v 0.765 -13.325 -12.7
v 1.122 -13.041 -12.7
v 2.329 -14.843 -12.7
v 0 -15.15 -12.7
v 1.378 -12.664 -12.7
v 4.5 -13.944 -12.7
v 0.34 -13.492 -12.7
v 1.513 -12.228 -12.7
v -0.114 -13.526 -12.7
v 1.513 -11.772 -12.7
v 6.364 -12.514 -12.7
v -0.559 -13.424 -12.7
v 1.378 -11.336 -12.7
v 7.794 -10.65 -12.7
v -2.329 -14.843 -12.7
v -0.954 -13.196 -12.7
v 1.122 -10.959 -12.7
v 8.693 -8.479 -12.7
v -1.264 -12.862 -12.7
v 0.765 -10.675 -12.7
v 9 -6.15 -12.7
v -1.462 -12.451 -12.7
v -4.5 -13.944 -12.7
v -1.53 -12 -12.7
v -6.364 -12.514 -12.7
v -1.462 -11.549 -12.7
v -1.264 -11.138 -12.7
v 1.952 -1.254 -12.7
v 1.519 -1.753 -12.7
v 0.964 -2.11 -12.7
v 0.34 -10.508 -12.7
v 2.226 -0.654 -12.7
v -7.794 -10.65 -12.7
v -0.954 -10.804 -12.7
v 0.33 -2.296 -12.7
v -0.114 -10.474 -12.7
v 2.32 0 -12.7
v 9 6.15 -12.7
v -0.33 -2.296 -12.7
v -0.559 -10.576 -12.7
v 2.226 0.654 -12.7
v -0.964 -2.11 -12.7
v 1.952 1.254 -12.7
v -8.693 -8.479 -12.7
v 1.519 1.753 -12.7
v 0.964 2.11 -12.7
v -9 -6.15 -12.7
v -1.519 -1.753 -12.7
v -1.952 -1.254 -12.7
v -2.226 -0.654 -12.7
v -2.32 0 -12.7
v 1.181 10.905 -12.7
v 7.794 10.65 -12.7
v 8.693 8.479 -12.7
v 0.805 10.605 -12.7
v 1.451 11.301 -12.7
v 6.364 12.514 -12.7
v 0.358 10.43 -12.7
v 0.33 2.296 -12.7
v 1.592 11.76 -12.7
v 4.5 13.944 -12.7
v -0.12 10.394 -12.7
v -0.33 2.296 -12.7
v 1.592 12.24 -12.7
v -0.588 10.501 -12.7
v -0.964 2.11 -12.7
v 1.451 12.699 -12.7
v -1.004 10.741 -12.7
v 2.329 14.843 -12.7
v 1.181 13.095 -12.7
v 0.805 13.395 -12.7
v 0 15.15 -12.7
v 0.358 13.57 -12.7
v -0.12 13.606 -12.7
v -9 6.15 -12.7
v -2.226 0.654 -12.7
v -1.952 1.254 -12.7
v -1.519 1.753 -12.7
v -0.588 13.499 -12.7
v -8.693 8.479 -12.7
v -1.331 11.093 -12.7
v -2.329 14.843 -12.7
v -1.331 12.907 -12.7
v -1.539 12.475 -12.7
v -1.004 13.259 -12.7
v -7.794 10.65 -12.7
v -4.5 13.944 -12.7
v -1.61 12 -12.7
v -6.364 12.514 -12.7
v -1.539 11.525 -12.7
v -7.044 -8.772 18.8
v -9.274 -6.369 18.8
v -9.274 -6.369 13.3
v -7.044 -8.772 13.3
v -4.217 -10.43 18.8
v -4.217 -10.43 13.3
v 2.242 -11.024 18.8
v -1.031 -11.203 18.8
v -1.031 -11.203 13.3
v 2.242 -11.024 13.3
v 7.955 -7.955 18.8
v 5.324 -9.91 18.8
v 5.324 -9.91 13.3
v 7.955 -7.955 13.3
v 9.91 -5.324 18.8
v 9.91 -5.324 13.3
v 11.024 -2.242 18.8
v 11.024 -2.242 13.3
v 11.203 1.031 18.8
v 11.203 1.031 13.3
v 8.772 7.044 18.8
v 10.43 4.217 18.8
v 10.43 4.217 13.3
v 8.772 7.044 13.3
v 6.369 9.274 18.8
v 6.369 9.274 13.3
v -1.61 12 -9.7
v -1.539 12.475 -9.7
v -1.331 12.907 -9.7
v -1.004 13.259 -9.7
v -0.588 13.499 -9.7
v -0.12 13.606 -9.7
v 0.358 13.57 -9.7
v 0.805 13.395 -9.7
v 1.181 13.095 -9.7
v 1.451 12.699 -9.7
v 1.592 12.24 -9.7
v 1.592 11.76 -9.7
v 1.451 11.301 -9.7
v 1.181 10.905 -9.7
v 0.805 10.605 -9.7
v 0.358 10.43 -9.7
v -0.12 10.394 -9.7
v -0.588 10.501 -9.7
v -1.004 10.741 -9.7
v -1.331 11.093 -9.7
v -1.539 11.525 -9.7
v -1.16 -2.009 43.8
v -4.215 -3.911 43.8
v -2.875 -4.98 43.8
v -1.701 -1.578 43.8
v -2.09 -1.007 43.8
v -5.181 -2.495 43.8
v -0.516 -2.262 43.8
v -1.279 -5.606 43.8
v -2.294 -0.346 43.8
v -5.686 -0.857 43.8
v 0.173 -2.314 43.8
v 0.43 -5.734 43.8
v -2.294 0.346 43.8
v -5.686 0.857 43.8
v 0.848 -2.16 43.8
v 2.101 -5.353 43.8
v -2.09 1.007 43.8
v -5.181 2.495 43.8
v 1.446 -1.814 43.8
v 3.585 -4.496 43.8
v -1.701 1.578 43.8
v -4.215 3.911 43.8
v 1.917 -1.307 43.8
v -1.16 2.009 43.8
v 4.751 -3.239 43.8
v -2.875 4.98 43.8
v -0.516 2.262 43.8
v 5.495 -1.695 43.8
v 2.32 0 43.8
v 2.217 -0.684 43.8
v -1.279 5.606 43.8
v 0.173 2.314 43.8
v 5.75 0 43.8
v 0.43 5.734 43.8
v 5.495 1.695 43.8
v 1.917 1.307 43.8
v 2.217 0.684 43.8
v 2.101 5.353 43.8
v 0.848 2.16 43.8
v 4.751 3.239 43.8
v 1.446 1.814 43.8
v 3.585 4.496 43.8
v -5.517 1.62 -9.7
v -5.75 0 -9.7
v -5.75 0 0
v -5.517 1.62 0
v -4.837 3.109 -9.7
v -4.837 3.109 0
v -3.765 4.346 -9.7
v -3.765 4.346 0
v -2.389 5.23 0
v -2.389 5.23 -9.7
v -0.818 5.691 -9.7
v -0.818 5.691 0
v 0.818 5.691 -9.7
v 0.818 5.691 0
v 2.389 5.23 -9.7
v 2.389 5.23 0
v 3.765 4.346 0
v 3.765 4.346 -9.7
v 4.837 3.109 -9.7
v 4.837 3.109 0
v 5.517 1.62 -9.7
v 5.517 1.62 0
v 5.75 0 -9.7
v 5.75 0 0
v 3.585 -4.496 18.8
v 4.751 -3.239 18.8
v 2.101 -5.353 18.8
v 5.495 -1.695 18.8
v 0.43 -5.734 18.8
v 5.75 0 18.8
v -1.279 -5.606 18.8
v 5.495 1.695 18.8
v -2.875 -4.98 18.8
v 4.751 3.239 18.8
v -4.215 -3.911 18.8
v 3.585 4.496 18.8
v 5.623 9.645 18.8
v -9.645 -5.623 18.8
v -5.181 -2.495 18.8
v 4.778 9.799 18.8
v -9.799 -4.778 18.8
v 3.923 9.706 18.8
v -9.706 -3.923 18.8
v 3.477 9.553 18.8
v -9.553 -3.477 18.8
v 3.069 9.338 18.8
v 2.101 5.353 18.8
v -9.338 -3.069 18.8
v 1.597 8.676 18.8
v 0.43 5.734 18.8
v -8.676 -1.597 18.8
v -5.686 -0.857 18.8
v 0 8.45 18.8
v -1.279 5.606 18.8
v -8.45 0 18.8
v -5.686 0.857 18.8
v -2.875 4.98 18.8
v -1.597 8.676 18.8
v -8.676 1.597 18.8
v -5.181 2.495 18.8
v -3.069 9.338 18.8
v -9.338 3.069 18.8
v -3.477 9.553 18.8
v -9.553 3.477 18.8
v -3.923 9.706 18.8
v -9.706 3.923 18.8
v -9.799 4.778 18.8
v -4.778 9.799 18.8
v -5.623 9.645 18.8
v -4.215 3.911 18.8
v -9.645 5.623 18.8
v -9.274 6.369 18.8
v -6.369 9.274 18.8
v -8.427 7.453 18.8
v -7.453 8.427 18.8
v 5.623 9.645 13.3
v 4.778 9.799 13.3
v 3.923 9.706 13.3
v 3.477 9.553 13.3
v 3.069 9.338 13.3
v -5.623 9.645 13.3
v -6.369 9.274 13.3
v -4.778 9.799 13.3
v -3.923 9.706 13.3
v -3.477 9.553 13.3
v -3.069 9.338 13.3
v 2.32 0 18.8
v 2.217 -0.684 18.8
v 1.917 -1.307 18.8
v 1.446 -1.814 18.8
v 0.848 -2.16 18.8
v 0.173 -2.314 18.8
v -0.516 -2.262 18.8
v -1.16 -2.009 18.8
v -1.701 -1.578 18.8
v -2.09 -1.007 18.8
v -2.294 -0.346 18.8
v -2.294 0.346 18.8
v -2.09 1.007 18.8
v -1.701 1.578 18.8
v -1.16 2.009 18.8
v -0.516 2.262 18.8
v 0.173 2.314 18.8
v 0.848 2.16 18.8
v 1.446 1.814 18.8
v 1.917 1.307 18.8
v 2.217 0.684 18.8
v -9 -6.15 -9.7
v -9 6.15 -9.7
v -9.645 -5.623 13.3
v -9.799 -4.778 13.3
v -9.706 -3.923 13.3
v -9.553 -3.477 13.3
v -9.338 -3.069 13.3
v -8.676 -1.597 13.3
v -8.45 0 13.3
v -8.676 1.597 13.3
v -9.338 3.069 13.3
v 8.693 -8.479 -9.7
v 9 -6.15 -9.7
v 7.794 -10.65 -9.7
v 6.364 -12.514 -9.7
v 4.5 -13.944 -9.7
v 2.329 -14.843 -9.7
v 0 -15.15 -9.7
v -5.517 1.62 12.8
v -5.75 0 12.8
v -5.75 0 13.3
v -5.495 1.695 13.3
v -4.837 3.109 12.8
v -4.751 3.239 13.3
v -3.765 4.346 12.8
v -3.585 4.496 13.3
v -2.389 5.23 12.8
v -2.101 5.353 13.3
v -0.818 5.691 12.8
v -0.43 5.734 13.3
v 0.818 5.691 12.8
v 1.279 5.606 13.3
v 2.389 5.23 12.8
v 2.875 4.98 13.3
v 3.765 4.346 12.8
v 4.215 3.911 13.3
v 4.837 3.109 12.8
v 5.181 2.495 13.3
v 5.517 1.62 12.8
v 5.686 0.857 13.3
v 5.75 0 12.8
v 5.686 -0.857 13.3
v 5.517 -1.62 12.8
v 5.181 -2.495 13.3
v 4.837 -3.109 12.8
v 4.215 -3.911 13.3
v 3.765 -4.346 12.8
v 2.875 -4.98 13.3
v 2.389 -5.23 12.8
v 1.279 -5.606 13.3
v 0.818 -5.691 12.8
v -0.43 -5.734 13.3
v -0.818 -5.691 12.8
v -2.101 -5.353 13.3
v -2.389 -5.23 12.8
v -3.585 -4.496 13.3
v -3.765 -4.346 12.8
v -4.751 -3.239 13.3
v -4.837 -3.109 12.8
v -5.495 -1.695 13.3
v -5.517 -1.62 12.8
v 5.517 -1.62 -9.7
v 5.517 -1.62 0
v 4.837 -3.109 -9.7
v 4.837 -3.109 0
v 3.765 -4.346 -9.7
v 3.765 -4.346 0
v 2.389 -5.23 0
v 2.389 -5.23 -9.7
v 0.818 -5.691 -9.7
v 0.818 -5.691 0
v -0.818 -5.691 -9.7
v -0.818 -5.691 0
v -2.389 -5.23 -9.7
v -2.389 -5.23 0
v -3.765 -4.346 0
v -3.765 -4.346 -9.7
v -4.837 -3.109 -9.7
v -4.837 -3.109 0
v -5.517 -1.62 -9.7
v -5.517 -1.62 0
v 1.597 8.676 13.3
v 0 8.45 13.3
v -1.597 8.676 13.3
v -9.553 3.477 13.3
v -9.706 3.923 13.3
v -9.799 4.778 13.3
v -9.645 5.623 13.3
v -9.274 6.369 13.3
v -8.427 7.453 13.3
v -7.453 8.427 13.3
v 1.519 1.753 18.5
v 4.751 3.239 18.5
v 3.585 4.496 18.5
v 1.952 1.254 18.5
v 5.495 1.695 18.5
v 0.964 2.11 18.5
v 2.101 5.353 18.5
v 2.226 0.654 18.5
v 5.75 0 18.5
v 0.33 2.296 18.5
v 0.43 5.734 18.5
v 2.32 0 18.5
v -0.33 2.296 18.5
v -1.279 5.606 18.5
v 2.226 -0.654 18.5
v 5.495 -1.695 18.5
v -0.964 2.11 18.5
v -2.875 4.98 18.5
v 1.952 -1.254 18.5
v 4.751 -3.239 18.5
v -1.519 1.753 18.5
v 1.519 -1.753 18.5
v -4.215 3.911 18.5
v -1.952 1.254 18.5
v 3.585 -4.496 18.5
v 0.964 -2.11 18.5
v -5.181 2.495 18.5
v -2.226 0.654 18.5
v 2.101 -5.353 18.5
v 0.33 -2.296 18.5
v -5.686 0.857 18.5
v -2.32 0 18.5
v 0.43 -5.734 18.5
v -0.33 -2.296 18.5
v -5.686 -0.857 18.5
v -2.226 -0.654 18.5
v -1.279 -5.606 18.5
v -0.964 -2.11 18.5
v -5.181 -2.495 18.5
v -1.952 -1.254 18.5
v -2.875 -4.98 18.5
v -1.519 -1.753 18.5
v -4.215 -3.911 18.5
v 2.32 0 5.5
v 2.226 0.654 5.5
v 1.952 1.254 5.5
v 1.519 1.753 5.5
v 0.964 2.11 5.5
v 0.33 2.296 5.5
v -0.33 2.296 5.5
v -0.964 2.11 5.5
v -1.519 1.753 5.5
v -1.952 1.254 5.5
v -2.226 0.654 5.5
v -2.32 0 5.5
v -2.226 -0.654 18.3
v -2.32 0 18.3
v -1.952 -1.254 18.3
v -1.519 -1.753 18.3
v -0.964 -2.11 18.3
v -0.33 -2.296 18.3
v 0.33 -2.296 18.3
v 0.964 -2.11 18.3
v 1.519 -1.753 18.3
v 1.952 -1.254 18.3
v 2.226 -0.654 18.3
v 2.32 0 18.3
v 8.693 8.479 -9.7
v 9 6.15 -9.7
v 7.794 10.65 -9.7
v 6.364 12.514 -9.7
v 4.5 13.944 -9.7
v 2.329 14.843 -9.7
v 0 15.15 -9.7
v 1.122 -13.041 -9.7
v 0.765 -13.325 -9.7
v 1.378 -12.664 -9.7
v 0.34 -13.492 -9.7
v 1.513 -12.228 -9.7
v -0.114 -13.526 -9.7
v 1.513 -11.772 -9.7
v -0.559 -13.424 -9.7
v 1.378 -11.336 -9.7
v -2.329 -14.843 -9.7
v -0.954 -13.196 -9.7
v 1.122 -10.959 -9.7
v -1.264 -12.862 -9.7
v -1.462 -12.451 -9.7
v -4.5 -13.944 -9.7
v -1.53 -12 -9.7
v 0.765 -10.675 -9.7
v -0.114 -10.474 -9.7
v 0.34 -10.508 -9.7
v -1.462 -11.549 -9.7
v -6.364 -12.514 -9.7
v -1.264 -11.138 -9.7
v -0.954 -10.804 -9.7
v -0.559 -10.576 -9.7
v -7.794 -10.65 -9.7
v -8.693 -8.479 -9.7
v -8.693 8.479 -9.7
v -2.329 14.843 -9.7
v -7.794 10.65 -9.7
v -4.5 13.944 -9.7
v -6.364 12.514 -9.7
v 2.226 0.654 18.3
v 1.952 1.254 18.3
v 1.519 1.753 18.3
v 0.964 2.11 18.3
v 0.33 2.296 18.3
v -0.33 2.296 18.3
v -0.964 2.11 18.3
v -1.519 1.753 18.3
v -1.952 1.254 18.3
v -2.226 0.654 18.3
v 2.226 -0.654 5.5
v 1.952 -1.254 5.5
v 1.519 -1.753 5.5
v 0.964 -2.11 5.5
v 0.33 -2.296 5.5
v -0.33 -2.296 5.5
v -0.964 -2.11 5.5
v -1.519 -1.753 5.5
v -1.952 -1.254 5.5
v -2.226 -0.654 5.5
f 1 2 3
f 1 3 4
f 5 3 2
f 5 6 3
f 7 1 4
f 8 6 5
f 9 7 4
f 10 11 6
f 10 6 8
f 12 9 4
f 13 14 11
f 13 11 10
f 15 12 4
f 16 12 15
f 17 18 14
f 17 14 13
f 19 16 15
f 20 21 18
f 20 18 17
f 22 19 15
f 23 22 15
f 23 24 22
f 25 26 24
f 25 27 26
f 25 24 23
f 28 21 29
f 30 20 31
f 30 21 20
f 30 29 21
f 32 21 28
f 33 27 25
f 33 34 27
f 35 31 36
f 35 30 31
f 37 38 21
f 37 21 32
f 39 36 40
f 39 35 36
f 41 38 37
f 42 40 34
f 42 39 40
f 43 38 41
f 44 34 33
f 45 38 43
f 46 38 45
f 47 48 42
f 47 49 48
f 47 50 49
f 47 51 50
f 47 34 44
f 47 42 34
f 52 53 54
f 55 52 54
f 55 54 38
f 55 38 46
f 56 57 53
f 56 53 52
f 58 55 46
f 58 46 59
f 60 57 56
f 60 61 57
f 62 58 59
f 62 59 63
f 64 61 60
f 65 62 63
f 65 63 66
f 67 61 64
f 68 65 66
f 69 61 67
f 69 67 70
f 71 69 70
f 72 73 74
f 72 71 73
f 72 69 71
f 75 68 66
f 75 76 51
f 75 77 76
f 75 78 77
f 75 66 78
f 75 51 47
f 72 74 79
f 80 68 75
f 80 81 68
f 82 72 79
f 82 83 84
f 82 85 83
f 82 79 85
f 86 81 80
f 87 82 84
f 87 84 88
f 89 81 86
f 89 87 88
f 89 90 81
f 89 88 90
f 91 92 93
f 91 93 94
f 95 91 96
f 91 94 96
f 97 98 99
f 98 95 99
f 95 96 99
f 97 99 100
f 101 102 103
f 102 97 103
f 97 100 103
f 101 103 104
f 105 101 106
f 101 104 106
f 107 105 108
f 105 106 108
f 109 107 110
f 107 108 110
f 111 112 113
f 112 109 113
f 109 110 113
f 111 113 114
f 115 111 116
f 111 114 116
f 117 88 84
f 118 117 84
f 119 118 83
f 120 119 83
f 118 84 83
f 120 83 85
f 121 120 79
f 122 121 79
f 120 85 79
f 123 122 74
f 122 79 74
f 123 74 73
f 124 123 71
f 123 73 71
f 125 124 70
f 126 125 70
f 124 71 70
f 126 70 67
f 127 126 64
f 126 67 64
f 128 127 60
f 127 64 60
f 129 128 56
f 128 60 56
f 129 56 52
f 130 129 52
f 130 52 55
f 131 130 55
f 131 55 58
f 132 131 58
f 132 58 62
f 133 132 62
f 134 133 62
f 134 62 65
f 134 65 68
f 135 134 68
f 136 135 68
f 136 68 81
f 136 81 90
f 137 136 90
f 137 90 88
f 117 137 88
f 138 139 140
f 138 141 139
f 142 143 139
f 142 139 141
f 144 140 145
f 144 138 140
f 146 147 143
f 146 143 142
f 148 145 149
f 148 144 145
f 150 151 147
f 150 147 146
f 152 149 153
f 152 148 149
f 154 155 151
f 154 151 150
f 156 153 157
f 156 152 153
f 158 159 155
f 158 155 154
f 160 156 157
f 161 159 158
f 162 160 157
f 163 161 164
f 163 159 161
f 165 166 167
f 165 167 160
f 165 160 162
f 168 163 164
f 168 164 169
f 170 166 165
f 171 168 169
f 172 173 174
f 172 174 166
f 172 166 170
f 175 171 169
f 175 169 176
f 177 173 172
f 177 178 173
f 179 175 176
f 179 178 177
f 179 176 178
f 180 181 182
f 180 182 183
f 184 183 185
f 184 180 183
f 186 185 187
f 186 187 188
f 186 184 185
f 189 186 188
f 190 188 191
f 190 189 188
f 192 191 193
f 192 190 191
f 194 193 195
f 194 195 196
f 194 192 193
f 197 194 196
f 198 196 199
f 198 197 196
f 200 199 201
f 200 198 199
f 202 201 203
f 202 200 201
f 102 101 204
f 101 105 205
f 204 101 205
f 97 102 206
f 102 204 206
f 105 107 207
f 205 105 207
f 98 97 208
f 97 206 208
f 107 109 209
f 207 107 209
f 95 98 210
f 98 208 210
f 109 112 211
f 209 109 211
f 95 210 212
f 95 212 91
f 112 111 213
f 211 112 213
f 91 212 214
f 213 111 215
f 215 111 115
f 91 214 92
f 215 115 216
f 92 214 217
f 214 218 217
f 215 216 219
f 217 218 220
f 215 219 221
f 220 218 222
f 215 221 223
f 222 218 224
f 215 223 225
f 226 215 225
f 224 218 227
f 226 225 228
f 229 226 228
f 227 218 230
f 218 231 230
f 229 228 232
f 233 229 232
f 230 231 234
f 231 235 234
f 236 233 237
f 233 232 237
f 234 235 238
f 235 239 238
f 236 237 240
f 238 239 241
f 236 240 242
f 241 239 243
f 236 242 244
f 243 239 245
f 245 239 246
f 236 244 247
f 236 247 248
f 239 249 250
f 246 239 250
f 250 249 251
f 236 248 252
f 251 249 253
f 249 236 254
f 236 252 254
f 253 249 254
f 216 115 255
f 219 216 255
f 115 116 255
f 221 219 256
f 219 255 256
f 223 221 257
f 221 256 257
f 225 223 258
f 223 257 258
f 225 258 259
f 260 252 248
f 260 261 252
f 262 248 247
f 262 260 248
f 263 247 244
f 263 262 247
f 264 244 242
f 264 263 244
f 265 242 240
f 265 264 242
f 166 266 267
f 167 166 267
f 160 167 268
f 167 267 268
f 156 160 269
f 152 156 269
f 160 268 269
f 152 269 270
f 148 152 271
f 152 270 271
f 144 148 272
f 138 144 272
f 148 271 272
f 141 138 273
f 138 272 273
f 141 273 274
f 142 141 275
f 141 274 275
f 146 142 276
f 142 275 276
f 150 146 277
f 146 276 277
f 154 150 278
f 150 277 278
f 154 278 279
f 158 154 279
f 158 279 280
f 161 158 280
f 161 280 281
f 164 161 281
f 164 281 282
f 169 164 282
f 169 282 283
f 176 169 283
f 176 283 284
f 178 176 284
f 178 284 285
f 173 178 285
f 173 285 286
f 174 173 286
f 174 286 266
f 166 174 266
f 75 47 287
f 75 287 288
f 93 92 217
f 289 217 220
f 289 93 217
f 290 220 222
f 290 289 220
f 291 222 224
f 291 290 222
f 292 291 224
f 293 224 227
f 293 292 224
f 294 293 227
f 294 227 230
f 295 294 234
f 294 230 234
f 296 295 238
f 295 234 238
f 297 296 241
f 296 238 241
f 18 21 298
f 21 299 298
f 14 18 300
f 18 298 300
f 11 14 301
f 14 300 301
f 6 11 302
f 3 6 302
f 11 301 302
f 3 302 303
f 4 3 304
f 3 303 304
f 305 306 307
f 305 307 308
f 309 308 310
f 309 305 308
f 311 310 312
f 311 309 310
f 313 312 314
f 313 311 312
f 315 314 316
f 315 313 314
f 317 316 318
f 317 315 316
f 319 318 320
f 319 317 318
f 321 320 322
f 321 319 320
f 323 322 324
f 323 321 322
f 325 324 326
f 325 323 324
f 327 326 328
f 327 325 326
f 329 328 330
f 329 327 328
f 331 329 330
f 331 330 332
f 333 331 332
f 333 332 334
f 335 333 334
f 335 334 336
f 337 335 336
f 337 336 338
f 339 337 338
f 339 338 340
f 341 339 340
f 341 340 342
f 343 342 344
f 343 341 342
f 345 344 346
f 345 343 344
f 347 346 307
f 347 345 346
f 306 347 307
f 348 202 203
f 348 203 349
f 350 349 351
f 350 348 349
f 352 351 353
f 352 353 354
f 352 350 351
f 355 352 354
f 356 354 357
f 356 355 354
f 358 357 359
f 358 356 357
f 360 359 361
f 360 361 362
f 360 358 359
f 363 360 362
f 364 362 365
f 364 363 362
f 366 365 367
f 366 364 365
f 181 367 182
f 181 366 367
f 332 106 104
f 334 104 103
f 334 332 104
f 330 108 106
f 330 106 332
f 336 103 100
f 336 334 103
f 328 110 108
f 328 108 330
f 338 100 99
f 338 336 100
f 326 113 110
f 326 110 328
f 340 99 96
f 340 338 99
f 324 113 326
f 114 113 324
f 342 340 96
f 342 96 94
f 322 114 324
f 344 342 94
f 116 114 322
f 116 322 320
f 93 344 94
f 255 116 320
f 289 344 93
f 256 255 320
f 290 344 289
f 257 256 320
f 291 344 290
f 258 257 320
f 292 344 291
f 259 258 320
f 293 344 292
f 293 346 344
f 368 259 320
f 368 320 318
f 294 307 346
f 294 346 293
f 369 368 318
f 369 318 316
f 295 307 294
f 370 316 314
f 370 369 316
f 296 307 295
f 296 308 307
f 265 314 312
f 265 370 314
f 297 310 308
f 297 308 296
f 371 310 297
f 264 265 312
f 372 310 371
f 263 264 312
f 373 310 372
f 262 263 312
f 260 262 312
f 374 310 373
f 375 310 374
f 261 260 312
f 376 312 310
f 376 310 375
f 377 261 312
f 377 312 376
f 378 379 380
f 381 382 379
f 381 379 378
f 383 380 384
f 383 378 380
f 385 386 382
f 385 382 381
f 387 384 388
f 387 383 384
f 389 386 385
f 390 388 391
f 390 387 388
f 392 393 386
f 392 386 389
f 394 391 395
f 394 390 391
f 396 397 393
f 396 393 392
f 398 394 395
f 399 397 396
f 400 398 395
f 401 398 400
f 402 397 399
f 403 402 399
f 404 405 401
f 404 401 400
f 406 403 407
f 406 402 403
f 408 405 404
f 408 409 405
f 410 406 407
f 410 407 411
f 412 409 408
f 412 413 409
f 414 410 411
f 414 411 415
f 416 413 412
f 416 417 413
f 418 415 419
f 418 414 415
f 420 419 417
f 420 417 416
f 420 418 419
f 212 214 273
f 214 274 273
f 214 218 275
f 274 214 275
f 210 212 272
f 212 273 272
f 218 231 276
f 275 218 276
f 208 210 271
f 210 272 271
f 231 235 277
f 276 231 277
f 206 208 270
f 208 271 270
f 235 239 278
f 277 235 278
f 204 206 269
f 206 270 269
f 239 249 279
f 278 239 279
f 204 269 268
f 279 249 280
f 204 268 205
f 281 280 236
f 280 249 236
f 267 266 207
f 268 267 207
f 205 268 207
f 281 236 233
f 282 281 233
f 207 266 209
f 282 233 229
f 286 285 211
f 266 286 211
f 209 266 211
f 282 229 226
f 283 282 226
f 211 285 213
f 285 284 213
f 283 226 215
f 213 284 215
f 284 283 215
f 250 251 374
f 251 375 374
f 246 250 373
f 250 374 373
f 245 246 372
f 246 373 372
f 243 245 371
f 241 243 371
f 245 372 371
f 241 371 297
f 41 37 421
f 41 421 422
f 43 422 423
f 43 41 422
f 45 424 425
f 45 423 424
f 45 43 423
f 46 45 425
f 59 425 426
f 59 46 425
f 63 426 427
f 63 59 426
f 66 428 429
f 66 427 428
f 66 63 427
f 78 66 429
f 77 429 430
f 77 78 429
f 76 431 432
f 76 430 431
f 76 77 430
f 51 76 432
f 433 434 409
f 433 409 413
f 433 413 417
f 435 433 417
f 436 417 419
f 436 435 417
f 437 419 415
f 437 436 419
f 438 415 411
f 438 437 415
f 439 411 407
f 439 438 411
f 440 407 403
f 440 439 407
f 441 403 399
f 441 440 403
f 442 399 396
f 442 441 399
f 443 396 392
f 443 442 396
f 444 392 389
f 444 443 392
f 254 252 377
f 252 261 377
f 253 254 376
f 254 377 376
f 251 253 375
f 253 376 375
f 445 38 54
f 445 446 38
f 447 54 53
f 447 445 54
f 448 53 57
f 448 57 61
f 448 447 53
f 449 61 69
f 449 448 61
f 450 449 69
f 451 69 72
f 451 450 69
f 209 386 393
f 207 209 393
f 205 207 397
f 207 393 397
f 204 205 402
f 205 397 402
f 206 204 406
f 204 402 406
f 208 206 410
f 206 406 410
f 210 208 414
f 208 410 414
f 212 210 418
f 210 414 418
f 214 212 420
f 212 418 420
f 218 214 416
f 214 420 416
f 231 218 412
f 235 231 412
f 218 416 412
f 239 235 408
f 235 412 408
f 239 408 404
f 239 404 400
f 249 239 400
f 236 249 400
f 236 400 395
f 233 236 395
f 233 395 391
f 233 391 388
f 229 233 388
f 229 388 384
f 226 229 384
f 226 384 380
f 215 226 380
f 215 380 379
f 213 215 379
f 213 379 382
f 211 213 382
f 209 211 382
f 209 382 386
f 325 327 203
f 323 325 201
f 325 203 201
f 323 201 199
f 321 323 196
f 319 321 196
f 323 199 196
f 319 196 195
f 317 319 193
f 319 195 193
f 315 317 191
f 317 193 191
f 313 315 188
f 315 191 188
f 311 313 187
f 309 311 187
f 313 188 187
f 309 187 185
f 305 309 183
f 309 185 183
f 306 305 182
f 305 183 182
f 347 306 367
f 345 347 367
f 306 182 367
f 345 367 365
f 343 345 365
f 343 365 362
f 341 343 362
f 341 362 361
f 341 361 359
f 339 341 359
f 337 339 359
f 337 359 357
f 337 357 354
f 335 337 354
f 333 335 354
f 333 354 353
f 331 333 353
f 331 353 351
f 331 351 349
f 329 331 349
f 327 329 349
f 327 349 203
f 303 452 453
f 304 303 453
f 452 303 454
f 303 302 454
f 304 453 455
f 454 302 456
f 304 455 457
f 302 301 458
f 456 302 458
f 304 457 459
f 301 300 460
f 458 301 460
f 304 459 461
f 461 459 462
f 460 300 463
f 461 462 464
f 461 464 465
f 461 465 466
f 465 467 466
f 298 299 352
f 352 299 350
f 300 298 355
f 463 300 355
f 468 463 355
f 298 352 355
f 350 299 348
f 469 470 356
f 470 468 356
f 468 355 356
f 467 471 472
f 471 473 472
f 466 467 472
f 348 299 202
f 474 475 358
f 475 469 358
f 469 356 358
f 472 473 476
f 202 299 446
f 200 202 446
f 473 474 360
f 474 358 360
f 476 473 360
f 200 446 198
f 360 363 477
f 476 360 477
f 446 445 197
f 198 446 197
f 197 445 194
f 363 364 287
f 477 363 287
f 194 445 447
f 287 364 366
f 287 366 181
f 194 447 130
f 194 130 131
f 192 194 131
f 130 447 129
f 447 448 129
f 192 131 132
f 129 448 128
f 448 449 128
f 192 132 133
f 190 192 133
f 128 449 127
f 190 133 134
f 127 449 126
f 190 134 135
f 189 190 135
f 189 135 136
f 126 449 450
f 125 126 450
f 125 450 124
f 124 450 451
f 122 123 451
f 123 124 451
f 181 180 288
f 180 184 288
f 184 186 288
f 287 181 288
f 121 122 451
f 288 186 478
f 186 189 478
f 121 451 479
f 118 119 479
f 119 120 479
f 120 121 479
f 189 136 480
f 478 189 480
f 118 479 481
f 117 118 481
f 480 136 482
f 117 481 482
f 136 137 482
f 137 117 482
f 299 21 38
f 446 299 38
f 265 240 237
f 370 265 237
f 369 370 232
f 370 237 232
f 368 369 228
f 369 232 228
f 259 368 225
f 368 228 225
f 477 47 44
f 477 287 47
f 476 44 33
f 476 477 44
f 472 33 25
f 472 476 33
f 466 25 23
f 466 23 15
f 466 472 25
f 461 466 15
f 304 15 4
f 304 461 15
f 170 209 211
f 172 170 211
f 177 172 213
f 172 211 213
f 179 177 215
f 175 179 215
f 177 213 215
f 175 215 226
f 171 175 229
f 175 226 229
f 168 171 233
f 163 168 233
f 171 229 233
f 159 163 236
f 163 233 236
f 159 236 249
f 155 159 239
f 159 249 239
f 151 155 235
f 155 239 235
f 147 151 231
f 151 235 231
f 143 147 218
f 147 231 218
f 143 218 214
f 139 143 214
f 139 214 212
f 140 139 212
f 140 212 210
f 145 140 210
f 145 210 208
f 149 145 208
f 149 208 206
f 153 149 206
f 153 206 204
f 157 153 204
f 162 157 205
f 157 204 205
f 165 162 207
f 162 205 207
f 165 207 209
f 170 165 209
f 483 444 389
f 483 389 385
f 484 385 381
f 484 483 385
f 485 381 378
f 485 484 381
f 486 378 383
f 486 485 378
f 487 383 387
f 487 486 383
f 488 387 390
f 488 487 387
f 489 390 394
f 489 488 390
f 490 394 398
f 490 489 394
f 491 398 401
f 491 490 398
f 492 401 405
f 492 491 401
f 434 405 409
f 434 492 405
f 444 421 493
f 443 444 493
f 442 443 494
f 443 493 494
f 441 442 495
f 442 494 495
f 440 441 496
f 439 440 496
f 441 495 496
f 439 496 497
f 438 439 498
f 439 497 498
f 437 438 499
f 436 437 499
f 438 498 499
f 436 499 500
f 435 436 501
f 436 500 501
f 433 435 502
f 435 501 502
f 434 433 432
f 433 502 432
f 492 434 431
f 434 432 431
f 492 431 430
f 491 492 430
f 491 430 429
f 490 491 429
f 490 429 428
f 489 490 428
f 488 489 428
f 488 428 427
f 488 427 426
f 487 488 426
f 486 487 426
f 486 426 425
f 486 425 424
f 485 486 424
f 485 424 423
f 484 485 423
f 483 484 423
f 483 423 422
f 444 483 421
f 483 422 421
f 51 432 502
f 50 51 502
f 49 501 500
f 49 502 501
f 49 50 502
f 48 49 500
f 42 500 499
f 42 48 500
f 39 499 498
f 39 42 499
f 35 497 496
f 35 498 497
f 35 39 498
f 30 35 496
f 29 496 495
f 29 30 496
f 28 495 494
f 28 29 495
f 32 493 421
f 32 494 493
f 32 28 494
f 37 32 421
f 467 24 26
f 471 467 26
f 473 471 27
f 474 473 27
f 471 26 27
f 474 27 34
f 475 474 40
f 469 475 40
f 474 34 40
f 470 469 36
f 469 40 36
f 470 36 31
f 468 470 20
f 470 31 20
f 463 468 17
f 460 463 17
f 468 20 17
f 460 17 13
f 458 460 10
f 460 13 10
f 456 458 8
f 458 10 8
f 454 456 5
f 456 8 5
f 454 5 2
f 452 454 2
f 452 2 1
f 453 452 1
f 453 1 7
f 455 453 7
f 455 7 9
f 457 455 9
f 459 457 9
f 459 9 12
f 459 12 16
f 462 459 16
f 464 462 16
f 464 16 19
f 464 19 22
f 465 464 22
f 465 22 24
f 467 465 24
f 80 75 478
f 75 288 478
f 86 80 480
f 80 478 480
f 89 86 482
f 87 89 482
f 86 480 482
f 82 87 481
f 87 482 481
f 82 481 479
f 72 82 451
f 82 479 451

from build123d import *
from build123d.topology import SkipClean

# Parameters (mm, degrees)
CROQUIS4_R               = 5.75
SALIENTE_EXTRUIR3_DEPTH  = 15.5
CROQUIS5_R               = 11.25
SALIENTE_EXTRUIR4_DEPTH  = 5.5
CROQUIS7_R               = 2.32
CORTAR_EXTRUIR2_DEPTH    = 25.5
SALIENTE_EXTRUIR5_START  = 12.7
CROQUIS8_R               = 5.75
SALIENTE_EXTRUIR5_DEPTH  = 12.7
CROQUIS9_W               = 18
CROQUIS9_H               = 30.3
SALIENTE_EXTRUIR6_DEPTH  = 3
CORTAR_EXTRUIR3_START    = -53
CROQUIS10_R              = 2.32
CORTAR_EXTRUIR3_DEPTH    = 53
REDONDEO5_R              = 9
CROQUIS14_R              = 1.610440683
CROQUIS14_R_2            = 1.53
CORTAR_EXTRUIR4_DEPTH    = 10
CROQUIS15_R              = 5.75
CROQUIS15_R_2            = 2.32
SALIENTE_EXTRUIR8_DEPTH  = 3
CROQUIS22_R              = 11.25
SALIENTE_EXTRUIR10_DEPTH = 10
CROQUIS24_R              = 23.765334052
CROQUIS24_R_2            = 5.75
CORTAR_EXTRUIR7_DEPTH    = 22.5
CROQUIS25_R              = 11.25
SALIENTE_EXTRUIR11_DEPTH = 5.5
CROQUIS27_R              = 11.25
CROQUIS27_R_2            = 5.75
CORTAR_EXTRUIR10_DEPTH   = 0.5
CROQUIS29_R              = 11.25
CROQUIS29_R_2            = 5.75
SALIENTE_EXTRUIR12_DEPTH = 5.5
CROQUIS30_R              = 5.75
SALIENTE_EXTRUIR13_DEPTH = 25
CROQUIS31_R              = 2.32
CORTAR_EXTRUIR11_DEPTH   = 105
CROQUIS32_R              = 5.75
CORTAR_EXTRUIR12_DEPTH   = 10
REDONDEO6_R              = 3


with BuildPart() as part:
    # Croquis4 → Saliente-Extruir3 (new body)
    with BuildSketch(Plane.XY):
        Circle(CROQUIS4_R)
    extrude(amount=SALIENTE_EXTRUIR3_DEPTH)

    # Croquis5 → Saliente-Extruir4 (add)
    with BuildSketch(Plane(origin=(0, 0, 0), x_dir=(-1, 0, 0), z_dir=(0, 0, -1))):
        Circle(CROQUIS5_R)
    extrude(amount=-SALIENTE_EXTRUIR4_DEPTH)

    # Croquis7 → Cortar-Extruir2 (cut)
    with BuildSketch(Plane(origin=(0, 0, 0), x_dir=(-1, 0, 0), z_dir=(0, 0, -1))):
        Circle(CROQUIS7_R)
    extrude(amount=-CORTAR_EXTRUIR2_DEPTH, mode=Mode.SUBTRACT)

    # Croquis8 → Saliente-Extruir5 (add)
    with BuildSketch(Plane(origin=(0, 0, 0), x_dir=(-1, 0, 0), z_dir=(0, 0, -1)).offset(SALIENTE_EXTRUIR5_START)):
        Circle(CROQUIS8_R)
    extrude(amount=-SALIENTE_EXTRUIR5_DEPTH)

    # Croquis9 → Saliente-Extruir6 (add)
    with BuildSketch(Plane(origin=(0, 0, -12.7), x_dir=(-1, 0, 0), z_dir=(0, 0, -1))):
        Rectangle(CROQUIS9_W, CROQUIS9_H)
    extrude(amount=-SALIENTE_EXTRUIR6_DEPTH)

    # Croquis10 → Cortar-Extruir3 (cut)
    with BuildSketch(Plane.XY.offset(15.5).offset(CORTAR_EXTRUIR3_START)):
        with Locations(Location((0, 0, 0), (0, 0, 180))):
            Circle(CROQUIS10_R)
    extrude(amount=CORTAR_EXTRUIR3_DEPTH, mode=Mode.SUBTRACT)

    # Redondeo5
    redondeo5_edges = [part.edges().sort_by_distance(p)[0] for p in [
        (9, -15.15, -11.2),
        (-9, -15.15, -11.2),
        (-9, 15.15, -11.2),
        (9, 15.15, -11.2),
    ]]
    fillet(redondeo5_edges, radius=REDONDEO5_R - 0.0001)  # a hair under: the kernel refuses the full size

    # Croquis14 → Cortar-Extruir4 (cut)
    with BuildSketch(Plane(origin=(0, 0, -12.7), x_dir=(-1, 0, 0), z_dir=(0, 0, -1))):
        with Locations((0, 12)):
            Circle(CROQUIS14_R)
        with Locations((0, -12)):
            Circle(CROQUIS14_R_2)
    extrude(amount=-CORTAR_EXTRUIR4_DEPTH, mode=Mode.SUBTRACT)

    # Croquis15 → Saliente-Extruir8 (add)
    with SkipClean():  # the faces are left unmerged after this step: merging them gives an invalid solid
        with BuildSketch(Plane.XY.offset(15.5)):
            with Locations(Location((0, 0, 0), (0, 0, 180))):
                Circle(CROQUIS15_R)
            with Locations(Location((0, 0, 0), (0, 0, 180))):
                Circle(CROQUIS15_R_2, mode=Mode.SUBTRACT)
        extrude(amount=SALIENTE_EXTRUIR8_DEPTH)

    # Croquis22 → Saliente-Extruir10 (add)
    with BuildSketch(Plane.XY.offset(5.5)):
        with Locations(Location((0, 0, 0), (0, 0, 180))):
            Circle(CROQUIS22_R)
    extrude(amount=SALIENTE_EXTRUIR10_DEPTH)

    # Croquis24 → Cortar-Extruir7 (cut)
    with BuildSketch(Plane.XY.offset(-9.7)):
        Circle(CROQUIS24_R)
        Circle(CROQUIS24_R_2, mode=Mode.SUBTRACT)
    extrude(amount=CORTAR_EXTRUIR7_DEPTH, mode=Mode.SUBTRACT)

    # Croquis25 → Saliente-Extruir11 (add)
    with SkipClean():  # the faces are left unmerged after this step: merging them gives an invalid solid
        with BuildSketch(Plane(origin=(0, 0, 12.8), x_dir=(-1, 0, 0), z_dir=(0, 0, -1))):
            Circle(CROQUIS25_R)
        extrude(amount=-SALIENTE_EXTRUIR11_DEPTH)

    # Croquis27 → Cortar-Extruir10 (cut)
    with SkipClean():  # the faces are left unmerged after this step: merging them gives an invalid solid
        with BuildSketch(Plane(origin=(0, 0, 12.8), x_dir=(-1, 0, 0), z_dir=(0, 0, -1))):
            Circle(CROQUIS27_R)
            Circle(CROQUIS27_R_2, mode=Mode.SUBTRACT)
        extrude(amount=-CORTAR_EXTRUIR10_DEPTH, mode=Mode.SUBTRACT)

    # Croquis29 → Saliente-Extruir12 (add)
    with SkipClean():  # the faces are left unmerged after this step: merging them gives an invalid solid
        with BuildSketch(Plane(origin=(0, 0, 13.3), x_dir=(-1, 0, 0), z_dir=(0, 0, -1))):
            Circle(CROQUIS29_R)
            with Locations(Location((0, 0, 0), (0, 0, 180))):
                Circle(CROQUIS29_R_2, mode=Mode.SUBTRACT)
        extrude(amount=-SALIENTE_EXTRUIR12_DEPTH)


with BuildPart() as body_2:
    # Croquis30 → Saliente-Extruir13 (new body)
    with BuildSketch(Plane.XY.offset(18.8)):
        Circle(CROQUIS30_R)
    extrude(amount=SALIENTE_EXTRUIR13_DEPTH)


with BuildPart() as cortar_extruir11_tool:
    # Croquis31 → Cortar-Extruir11 (new body)
    with BuildSketch(Plane(origin=(0, 0, -12.7), x_dir=(-1, 0, 0), z_dir=(0, 0, -1))):
        with Locations(Location((0, 0, 0), (0, 0, 180))):
            Circle(CROQUIS31_R)
    extrude(amount=-CORTAR_EXTRUIR11_DEPTH)


with BuildPart() as part_1:
    add(part.part)

    # Cortar-Extruir11: cut by cortar_extruir11_tool
    add(cortar_extruir11_tool.part, mode=Mode.SUBTRACT)

    # Croquis32 → Cortar-Extruir12 (cut)
    with BuildSketch(Plane.XY.offset(18.8)):
        with Locations((-14.2, 0)):
            Circle(CROQUIS32_R)
        with Locations((0, 14.2)):
            Circle(CROQUIS32_R)
    extrude(amount=-CORTAR_EXTRUIR12_DEPTH, mode=Mode.SUBTRACT)

    # Redondeo6
    redondeo6_edges = [part_1.edges().sort_by_distance(p)[0] for p in [
        (-10.392253521, 4.308545782, 16.9),
        (-10.392253521, -4.308545782, 16.9),
        (4.308545782, 10.392253521, 16.9),
        (-4.308545782, 10.392253521, 16.9),
    ]]
    fillet(redondeo6_edges, radius=REDONDEO6_R)


with BuildPart() as body_2_1:
    add(body_2.part)

    # Cortar-Extruir11: cut by cortar_extruir11_tool
    add(cortar_extruir11_tool.part, mode=Mode.SUBTRACT)


solid = Compound([part_1.part, body_2_1.part])
